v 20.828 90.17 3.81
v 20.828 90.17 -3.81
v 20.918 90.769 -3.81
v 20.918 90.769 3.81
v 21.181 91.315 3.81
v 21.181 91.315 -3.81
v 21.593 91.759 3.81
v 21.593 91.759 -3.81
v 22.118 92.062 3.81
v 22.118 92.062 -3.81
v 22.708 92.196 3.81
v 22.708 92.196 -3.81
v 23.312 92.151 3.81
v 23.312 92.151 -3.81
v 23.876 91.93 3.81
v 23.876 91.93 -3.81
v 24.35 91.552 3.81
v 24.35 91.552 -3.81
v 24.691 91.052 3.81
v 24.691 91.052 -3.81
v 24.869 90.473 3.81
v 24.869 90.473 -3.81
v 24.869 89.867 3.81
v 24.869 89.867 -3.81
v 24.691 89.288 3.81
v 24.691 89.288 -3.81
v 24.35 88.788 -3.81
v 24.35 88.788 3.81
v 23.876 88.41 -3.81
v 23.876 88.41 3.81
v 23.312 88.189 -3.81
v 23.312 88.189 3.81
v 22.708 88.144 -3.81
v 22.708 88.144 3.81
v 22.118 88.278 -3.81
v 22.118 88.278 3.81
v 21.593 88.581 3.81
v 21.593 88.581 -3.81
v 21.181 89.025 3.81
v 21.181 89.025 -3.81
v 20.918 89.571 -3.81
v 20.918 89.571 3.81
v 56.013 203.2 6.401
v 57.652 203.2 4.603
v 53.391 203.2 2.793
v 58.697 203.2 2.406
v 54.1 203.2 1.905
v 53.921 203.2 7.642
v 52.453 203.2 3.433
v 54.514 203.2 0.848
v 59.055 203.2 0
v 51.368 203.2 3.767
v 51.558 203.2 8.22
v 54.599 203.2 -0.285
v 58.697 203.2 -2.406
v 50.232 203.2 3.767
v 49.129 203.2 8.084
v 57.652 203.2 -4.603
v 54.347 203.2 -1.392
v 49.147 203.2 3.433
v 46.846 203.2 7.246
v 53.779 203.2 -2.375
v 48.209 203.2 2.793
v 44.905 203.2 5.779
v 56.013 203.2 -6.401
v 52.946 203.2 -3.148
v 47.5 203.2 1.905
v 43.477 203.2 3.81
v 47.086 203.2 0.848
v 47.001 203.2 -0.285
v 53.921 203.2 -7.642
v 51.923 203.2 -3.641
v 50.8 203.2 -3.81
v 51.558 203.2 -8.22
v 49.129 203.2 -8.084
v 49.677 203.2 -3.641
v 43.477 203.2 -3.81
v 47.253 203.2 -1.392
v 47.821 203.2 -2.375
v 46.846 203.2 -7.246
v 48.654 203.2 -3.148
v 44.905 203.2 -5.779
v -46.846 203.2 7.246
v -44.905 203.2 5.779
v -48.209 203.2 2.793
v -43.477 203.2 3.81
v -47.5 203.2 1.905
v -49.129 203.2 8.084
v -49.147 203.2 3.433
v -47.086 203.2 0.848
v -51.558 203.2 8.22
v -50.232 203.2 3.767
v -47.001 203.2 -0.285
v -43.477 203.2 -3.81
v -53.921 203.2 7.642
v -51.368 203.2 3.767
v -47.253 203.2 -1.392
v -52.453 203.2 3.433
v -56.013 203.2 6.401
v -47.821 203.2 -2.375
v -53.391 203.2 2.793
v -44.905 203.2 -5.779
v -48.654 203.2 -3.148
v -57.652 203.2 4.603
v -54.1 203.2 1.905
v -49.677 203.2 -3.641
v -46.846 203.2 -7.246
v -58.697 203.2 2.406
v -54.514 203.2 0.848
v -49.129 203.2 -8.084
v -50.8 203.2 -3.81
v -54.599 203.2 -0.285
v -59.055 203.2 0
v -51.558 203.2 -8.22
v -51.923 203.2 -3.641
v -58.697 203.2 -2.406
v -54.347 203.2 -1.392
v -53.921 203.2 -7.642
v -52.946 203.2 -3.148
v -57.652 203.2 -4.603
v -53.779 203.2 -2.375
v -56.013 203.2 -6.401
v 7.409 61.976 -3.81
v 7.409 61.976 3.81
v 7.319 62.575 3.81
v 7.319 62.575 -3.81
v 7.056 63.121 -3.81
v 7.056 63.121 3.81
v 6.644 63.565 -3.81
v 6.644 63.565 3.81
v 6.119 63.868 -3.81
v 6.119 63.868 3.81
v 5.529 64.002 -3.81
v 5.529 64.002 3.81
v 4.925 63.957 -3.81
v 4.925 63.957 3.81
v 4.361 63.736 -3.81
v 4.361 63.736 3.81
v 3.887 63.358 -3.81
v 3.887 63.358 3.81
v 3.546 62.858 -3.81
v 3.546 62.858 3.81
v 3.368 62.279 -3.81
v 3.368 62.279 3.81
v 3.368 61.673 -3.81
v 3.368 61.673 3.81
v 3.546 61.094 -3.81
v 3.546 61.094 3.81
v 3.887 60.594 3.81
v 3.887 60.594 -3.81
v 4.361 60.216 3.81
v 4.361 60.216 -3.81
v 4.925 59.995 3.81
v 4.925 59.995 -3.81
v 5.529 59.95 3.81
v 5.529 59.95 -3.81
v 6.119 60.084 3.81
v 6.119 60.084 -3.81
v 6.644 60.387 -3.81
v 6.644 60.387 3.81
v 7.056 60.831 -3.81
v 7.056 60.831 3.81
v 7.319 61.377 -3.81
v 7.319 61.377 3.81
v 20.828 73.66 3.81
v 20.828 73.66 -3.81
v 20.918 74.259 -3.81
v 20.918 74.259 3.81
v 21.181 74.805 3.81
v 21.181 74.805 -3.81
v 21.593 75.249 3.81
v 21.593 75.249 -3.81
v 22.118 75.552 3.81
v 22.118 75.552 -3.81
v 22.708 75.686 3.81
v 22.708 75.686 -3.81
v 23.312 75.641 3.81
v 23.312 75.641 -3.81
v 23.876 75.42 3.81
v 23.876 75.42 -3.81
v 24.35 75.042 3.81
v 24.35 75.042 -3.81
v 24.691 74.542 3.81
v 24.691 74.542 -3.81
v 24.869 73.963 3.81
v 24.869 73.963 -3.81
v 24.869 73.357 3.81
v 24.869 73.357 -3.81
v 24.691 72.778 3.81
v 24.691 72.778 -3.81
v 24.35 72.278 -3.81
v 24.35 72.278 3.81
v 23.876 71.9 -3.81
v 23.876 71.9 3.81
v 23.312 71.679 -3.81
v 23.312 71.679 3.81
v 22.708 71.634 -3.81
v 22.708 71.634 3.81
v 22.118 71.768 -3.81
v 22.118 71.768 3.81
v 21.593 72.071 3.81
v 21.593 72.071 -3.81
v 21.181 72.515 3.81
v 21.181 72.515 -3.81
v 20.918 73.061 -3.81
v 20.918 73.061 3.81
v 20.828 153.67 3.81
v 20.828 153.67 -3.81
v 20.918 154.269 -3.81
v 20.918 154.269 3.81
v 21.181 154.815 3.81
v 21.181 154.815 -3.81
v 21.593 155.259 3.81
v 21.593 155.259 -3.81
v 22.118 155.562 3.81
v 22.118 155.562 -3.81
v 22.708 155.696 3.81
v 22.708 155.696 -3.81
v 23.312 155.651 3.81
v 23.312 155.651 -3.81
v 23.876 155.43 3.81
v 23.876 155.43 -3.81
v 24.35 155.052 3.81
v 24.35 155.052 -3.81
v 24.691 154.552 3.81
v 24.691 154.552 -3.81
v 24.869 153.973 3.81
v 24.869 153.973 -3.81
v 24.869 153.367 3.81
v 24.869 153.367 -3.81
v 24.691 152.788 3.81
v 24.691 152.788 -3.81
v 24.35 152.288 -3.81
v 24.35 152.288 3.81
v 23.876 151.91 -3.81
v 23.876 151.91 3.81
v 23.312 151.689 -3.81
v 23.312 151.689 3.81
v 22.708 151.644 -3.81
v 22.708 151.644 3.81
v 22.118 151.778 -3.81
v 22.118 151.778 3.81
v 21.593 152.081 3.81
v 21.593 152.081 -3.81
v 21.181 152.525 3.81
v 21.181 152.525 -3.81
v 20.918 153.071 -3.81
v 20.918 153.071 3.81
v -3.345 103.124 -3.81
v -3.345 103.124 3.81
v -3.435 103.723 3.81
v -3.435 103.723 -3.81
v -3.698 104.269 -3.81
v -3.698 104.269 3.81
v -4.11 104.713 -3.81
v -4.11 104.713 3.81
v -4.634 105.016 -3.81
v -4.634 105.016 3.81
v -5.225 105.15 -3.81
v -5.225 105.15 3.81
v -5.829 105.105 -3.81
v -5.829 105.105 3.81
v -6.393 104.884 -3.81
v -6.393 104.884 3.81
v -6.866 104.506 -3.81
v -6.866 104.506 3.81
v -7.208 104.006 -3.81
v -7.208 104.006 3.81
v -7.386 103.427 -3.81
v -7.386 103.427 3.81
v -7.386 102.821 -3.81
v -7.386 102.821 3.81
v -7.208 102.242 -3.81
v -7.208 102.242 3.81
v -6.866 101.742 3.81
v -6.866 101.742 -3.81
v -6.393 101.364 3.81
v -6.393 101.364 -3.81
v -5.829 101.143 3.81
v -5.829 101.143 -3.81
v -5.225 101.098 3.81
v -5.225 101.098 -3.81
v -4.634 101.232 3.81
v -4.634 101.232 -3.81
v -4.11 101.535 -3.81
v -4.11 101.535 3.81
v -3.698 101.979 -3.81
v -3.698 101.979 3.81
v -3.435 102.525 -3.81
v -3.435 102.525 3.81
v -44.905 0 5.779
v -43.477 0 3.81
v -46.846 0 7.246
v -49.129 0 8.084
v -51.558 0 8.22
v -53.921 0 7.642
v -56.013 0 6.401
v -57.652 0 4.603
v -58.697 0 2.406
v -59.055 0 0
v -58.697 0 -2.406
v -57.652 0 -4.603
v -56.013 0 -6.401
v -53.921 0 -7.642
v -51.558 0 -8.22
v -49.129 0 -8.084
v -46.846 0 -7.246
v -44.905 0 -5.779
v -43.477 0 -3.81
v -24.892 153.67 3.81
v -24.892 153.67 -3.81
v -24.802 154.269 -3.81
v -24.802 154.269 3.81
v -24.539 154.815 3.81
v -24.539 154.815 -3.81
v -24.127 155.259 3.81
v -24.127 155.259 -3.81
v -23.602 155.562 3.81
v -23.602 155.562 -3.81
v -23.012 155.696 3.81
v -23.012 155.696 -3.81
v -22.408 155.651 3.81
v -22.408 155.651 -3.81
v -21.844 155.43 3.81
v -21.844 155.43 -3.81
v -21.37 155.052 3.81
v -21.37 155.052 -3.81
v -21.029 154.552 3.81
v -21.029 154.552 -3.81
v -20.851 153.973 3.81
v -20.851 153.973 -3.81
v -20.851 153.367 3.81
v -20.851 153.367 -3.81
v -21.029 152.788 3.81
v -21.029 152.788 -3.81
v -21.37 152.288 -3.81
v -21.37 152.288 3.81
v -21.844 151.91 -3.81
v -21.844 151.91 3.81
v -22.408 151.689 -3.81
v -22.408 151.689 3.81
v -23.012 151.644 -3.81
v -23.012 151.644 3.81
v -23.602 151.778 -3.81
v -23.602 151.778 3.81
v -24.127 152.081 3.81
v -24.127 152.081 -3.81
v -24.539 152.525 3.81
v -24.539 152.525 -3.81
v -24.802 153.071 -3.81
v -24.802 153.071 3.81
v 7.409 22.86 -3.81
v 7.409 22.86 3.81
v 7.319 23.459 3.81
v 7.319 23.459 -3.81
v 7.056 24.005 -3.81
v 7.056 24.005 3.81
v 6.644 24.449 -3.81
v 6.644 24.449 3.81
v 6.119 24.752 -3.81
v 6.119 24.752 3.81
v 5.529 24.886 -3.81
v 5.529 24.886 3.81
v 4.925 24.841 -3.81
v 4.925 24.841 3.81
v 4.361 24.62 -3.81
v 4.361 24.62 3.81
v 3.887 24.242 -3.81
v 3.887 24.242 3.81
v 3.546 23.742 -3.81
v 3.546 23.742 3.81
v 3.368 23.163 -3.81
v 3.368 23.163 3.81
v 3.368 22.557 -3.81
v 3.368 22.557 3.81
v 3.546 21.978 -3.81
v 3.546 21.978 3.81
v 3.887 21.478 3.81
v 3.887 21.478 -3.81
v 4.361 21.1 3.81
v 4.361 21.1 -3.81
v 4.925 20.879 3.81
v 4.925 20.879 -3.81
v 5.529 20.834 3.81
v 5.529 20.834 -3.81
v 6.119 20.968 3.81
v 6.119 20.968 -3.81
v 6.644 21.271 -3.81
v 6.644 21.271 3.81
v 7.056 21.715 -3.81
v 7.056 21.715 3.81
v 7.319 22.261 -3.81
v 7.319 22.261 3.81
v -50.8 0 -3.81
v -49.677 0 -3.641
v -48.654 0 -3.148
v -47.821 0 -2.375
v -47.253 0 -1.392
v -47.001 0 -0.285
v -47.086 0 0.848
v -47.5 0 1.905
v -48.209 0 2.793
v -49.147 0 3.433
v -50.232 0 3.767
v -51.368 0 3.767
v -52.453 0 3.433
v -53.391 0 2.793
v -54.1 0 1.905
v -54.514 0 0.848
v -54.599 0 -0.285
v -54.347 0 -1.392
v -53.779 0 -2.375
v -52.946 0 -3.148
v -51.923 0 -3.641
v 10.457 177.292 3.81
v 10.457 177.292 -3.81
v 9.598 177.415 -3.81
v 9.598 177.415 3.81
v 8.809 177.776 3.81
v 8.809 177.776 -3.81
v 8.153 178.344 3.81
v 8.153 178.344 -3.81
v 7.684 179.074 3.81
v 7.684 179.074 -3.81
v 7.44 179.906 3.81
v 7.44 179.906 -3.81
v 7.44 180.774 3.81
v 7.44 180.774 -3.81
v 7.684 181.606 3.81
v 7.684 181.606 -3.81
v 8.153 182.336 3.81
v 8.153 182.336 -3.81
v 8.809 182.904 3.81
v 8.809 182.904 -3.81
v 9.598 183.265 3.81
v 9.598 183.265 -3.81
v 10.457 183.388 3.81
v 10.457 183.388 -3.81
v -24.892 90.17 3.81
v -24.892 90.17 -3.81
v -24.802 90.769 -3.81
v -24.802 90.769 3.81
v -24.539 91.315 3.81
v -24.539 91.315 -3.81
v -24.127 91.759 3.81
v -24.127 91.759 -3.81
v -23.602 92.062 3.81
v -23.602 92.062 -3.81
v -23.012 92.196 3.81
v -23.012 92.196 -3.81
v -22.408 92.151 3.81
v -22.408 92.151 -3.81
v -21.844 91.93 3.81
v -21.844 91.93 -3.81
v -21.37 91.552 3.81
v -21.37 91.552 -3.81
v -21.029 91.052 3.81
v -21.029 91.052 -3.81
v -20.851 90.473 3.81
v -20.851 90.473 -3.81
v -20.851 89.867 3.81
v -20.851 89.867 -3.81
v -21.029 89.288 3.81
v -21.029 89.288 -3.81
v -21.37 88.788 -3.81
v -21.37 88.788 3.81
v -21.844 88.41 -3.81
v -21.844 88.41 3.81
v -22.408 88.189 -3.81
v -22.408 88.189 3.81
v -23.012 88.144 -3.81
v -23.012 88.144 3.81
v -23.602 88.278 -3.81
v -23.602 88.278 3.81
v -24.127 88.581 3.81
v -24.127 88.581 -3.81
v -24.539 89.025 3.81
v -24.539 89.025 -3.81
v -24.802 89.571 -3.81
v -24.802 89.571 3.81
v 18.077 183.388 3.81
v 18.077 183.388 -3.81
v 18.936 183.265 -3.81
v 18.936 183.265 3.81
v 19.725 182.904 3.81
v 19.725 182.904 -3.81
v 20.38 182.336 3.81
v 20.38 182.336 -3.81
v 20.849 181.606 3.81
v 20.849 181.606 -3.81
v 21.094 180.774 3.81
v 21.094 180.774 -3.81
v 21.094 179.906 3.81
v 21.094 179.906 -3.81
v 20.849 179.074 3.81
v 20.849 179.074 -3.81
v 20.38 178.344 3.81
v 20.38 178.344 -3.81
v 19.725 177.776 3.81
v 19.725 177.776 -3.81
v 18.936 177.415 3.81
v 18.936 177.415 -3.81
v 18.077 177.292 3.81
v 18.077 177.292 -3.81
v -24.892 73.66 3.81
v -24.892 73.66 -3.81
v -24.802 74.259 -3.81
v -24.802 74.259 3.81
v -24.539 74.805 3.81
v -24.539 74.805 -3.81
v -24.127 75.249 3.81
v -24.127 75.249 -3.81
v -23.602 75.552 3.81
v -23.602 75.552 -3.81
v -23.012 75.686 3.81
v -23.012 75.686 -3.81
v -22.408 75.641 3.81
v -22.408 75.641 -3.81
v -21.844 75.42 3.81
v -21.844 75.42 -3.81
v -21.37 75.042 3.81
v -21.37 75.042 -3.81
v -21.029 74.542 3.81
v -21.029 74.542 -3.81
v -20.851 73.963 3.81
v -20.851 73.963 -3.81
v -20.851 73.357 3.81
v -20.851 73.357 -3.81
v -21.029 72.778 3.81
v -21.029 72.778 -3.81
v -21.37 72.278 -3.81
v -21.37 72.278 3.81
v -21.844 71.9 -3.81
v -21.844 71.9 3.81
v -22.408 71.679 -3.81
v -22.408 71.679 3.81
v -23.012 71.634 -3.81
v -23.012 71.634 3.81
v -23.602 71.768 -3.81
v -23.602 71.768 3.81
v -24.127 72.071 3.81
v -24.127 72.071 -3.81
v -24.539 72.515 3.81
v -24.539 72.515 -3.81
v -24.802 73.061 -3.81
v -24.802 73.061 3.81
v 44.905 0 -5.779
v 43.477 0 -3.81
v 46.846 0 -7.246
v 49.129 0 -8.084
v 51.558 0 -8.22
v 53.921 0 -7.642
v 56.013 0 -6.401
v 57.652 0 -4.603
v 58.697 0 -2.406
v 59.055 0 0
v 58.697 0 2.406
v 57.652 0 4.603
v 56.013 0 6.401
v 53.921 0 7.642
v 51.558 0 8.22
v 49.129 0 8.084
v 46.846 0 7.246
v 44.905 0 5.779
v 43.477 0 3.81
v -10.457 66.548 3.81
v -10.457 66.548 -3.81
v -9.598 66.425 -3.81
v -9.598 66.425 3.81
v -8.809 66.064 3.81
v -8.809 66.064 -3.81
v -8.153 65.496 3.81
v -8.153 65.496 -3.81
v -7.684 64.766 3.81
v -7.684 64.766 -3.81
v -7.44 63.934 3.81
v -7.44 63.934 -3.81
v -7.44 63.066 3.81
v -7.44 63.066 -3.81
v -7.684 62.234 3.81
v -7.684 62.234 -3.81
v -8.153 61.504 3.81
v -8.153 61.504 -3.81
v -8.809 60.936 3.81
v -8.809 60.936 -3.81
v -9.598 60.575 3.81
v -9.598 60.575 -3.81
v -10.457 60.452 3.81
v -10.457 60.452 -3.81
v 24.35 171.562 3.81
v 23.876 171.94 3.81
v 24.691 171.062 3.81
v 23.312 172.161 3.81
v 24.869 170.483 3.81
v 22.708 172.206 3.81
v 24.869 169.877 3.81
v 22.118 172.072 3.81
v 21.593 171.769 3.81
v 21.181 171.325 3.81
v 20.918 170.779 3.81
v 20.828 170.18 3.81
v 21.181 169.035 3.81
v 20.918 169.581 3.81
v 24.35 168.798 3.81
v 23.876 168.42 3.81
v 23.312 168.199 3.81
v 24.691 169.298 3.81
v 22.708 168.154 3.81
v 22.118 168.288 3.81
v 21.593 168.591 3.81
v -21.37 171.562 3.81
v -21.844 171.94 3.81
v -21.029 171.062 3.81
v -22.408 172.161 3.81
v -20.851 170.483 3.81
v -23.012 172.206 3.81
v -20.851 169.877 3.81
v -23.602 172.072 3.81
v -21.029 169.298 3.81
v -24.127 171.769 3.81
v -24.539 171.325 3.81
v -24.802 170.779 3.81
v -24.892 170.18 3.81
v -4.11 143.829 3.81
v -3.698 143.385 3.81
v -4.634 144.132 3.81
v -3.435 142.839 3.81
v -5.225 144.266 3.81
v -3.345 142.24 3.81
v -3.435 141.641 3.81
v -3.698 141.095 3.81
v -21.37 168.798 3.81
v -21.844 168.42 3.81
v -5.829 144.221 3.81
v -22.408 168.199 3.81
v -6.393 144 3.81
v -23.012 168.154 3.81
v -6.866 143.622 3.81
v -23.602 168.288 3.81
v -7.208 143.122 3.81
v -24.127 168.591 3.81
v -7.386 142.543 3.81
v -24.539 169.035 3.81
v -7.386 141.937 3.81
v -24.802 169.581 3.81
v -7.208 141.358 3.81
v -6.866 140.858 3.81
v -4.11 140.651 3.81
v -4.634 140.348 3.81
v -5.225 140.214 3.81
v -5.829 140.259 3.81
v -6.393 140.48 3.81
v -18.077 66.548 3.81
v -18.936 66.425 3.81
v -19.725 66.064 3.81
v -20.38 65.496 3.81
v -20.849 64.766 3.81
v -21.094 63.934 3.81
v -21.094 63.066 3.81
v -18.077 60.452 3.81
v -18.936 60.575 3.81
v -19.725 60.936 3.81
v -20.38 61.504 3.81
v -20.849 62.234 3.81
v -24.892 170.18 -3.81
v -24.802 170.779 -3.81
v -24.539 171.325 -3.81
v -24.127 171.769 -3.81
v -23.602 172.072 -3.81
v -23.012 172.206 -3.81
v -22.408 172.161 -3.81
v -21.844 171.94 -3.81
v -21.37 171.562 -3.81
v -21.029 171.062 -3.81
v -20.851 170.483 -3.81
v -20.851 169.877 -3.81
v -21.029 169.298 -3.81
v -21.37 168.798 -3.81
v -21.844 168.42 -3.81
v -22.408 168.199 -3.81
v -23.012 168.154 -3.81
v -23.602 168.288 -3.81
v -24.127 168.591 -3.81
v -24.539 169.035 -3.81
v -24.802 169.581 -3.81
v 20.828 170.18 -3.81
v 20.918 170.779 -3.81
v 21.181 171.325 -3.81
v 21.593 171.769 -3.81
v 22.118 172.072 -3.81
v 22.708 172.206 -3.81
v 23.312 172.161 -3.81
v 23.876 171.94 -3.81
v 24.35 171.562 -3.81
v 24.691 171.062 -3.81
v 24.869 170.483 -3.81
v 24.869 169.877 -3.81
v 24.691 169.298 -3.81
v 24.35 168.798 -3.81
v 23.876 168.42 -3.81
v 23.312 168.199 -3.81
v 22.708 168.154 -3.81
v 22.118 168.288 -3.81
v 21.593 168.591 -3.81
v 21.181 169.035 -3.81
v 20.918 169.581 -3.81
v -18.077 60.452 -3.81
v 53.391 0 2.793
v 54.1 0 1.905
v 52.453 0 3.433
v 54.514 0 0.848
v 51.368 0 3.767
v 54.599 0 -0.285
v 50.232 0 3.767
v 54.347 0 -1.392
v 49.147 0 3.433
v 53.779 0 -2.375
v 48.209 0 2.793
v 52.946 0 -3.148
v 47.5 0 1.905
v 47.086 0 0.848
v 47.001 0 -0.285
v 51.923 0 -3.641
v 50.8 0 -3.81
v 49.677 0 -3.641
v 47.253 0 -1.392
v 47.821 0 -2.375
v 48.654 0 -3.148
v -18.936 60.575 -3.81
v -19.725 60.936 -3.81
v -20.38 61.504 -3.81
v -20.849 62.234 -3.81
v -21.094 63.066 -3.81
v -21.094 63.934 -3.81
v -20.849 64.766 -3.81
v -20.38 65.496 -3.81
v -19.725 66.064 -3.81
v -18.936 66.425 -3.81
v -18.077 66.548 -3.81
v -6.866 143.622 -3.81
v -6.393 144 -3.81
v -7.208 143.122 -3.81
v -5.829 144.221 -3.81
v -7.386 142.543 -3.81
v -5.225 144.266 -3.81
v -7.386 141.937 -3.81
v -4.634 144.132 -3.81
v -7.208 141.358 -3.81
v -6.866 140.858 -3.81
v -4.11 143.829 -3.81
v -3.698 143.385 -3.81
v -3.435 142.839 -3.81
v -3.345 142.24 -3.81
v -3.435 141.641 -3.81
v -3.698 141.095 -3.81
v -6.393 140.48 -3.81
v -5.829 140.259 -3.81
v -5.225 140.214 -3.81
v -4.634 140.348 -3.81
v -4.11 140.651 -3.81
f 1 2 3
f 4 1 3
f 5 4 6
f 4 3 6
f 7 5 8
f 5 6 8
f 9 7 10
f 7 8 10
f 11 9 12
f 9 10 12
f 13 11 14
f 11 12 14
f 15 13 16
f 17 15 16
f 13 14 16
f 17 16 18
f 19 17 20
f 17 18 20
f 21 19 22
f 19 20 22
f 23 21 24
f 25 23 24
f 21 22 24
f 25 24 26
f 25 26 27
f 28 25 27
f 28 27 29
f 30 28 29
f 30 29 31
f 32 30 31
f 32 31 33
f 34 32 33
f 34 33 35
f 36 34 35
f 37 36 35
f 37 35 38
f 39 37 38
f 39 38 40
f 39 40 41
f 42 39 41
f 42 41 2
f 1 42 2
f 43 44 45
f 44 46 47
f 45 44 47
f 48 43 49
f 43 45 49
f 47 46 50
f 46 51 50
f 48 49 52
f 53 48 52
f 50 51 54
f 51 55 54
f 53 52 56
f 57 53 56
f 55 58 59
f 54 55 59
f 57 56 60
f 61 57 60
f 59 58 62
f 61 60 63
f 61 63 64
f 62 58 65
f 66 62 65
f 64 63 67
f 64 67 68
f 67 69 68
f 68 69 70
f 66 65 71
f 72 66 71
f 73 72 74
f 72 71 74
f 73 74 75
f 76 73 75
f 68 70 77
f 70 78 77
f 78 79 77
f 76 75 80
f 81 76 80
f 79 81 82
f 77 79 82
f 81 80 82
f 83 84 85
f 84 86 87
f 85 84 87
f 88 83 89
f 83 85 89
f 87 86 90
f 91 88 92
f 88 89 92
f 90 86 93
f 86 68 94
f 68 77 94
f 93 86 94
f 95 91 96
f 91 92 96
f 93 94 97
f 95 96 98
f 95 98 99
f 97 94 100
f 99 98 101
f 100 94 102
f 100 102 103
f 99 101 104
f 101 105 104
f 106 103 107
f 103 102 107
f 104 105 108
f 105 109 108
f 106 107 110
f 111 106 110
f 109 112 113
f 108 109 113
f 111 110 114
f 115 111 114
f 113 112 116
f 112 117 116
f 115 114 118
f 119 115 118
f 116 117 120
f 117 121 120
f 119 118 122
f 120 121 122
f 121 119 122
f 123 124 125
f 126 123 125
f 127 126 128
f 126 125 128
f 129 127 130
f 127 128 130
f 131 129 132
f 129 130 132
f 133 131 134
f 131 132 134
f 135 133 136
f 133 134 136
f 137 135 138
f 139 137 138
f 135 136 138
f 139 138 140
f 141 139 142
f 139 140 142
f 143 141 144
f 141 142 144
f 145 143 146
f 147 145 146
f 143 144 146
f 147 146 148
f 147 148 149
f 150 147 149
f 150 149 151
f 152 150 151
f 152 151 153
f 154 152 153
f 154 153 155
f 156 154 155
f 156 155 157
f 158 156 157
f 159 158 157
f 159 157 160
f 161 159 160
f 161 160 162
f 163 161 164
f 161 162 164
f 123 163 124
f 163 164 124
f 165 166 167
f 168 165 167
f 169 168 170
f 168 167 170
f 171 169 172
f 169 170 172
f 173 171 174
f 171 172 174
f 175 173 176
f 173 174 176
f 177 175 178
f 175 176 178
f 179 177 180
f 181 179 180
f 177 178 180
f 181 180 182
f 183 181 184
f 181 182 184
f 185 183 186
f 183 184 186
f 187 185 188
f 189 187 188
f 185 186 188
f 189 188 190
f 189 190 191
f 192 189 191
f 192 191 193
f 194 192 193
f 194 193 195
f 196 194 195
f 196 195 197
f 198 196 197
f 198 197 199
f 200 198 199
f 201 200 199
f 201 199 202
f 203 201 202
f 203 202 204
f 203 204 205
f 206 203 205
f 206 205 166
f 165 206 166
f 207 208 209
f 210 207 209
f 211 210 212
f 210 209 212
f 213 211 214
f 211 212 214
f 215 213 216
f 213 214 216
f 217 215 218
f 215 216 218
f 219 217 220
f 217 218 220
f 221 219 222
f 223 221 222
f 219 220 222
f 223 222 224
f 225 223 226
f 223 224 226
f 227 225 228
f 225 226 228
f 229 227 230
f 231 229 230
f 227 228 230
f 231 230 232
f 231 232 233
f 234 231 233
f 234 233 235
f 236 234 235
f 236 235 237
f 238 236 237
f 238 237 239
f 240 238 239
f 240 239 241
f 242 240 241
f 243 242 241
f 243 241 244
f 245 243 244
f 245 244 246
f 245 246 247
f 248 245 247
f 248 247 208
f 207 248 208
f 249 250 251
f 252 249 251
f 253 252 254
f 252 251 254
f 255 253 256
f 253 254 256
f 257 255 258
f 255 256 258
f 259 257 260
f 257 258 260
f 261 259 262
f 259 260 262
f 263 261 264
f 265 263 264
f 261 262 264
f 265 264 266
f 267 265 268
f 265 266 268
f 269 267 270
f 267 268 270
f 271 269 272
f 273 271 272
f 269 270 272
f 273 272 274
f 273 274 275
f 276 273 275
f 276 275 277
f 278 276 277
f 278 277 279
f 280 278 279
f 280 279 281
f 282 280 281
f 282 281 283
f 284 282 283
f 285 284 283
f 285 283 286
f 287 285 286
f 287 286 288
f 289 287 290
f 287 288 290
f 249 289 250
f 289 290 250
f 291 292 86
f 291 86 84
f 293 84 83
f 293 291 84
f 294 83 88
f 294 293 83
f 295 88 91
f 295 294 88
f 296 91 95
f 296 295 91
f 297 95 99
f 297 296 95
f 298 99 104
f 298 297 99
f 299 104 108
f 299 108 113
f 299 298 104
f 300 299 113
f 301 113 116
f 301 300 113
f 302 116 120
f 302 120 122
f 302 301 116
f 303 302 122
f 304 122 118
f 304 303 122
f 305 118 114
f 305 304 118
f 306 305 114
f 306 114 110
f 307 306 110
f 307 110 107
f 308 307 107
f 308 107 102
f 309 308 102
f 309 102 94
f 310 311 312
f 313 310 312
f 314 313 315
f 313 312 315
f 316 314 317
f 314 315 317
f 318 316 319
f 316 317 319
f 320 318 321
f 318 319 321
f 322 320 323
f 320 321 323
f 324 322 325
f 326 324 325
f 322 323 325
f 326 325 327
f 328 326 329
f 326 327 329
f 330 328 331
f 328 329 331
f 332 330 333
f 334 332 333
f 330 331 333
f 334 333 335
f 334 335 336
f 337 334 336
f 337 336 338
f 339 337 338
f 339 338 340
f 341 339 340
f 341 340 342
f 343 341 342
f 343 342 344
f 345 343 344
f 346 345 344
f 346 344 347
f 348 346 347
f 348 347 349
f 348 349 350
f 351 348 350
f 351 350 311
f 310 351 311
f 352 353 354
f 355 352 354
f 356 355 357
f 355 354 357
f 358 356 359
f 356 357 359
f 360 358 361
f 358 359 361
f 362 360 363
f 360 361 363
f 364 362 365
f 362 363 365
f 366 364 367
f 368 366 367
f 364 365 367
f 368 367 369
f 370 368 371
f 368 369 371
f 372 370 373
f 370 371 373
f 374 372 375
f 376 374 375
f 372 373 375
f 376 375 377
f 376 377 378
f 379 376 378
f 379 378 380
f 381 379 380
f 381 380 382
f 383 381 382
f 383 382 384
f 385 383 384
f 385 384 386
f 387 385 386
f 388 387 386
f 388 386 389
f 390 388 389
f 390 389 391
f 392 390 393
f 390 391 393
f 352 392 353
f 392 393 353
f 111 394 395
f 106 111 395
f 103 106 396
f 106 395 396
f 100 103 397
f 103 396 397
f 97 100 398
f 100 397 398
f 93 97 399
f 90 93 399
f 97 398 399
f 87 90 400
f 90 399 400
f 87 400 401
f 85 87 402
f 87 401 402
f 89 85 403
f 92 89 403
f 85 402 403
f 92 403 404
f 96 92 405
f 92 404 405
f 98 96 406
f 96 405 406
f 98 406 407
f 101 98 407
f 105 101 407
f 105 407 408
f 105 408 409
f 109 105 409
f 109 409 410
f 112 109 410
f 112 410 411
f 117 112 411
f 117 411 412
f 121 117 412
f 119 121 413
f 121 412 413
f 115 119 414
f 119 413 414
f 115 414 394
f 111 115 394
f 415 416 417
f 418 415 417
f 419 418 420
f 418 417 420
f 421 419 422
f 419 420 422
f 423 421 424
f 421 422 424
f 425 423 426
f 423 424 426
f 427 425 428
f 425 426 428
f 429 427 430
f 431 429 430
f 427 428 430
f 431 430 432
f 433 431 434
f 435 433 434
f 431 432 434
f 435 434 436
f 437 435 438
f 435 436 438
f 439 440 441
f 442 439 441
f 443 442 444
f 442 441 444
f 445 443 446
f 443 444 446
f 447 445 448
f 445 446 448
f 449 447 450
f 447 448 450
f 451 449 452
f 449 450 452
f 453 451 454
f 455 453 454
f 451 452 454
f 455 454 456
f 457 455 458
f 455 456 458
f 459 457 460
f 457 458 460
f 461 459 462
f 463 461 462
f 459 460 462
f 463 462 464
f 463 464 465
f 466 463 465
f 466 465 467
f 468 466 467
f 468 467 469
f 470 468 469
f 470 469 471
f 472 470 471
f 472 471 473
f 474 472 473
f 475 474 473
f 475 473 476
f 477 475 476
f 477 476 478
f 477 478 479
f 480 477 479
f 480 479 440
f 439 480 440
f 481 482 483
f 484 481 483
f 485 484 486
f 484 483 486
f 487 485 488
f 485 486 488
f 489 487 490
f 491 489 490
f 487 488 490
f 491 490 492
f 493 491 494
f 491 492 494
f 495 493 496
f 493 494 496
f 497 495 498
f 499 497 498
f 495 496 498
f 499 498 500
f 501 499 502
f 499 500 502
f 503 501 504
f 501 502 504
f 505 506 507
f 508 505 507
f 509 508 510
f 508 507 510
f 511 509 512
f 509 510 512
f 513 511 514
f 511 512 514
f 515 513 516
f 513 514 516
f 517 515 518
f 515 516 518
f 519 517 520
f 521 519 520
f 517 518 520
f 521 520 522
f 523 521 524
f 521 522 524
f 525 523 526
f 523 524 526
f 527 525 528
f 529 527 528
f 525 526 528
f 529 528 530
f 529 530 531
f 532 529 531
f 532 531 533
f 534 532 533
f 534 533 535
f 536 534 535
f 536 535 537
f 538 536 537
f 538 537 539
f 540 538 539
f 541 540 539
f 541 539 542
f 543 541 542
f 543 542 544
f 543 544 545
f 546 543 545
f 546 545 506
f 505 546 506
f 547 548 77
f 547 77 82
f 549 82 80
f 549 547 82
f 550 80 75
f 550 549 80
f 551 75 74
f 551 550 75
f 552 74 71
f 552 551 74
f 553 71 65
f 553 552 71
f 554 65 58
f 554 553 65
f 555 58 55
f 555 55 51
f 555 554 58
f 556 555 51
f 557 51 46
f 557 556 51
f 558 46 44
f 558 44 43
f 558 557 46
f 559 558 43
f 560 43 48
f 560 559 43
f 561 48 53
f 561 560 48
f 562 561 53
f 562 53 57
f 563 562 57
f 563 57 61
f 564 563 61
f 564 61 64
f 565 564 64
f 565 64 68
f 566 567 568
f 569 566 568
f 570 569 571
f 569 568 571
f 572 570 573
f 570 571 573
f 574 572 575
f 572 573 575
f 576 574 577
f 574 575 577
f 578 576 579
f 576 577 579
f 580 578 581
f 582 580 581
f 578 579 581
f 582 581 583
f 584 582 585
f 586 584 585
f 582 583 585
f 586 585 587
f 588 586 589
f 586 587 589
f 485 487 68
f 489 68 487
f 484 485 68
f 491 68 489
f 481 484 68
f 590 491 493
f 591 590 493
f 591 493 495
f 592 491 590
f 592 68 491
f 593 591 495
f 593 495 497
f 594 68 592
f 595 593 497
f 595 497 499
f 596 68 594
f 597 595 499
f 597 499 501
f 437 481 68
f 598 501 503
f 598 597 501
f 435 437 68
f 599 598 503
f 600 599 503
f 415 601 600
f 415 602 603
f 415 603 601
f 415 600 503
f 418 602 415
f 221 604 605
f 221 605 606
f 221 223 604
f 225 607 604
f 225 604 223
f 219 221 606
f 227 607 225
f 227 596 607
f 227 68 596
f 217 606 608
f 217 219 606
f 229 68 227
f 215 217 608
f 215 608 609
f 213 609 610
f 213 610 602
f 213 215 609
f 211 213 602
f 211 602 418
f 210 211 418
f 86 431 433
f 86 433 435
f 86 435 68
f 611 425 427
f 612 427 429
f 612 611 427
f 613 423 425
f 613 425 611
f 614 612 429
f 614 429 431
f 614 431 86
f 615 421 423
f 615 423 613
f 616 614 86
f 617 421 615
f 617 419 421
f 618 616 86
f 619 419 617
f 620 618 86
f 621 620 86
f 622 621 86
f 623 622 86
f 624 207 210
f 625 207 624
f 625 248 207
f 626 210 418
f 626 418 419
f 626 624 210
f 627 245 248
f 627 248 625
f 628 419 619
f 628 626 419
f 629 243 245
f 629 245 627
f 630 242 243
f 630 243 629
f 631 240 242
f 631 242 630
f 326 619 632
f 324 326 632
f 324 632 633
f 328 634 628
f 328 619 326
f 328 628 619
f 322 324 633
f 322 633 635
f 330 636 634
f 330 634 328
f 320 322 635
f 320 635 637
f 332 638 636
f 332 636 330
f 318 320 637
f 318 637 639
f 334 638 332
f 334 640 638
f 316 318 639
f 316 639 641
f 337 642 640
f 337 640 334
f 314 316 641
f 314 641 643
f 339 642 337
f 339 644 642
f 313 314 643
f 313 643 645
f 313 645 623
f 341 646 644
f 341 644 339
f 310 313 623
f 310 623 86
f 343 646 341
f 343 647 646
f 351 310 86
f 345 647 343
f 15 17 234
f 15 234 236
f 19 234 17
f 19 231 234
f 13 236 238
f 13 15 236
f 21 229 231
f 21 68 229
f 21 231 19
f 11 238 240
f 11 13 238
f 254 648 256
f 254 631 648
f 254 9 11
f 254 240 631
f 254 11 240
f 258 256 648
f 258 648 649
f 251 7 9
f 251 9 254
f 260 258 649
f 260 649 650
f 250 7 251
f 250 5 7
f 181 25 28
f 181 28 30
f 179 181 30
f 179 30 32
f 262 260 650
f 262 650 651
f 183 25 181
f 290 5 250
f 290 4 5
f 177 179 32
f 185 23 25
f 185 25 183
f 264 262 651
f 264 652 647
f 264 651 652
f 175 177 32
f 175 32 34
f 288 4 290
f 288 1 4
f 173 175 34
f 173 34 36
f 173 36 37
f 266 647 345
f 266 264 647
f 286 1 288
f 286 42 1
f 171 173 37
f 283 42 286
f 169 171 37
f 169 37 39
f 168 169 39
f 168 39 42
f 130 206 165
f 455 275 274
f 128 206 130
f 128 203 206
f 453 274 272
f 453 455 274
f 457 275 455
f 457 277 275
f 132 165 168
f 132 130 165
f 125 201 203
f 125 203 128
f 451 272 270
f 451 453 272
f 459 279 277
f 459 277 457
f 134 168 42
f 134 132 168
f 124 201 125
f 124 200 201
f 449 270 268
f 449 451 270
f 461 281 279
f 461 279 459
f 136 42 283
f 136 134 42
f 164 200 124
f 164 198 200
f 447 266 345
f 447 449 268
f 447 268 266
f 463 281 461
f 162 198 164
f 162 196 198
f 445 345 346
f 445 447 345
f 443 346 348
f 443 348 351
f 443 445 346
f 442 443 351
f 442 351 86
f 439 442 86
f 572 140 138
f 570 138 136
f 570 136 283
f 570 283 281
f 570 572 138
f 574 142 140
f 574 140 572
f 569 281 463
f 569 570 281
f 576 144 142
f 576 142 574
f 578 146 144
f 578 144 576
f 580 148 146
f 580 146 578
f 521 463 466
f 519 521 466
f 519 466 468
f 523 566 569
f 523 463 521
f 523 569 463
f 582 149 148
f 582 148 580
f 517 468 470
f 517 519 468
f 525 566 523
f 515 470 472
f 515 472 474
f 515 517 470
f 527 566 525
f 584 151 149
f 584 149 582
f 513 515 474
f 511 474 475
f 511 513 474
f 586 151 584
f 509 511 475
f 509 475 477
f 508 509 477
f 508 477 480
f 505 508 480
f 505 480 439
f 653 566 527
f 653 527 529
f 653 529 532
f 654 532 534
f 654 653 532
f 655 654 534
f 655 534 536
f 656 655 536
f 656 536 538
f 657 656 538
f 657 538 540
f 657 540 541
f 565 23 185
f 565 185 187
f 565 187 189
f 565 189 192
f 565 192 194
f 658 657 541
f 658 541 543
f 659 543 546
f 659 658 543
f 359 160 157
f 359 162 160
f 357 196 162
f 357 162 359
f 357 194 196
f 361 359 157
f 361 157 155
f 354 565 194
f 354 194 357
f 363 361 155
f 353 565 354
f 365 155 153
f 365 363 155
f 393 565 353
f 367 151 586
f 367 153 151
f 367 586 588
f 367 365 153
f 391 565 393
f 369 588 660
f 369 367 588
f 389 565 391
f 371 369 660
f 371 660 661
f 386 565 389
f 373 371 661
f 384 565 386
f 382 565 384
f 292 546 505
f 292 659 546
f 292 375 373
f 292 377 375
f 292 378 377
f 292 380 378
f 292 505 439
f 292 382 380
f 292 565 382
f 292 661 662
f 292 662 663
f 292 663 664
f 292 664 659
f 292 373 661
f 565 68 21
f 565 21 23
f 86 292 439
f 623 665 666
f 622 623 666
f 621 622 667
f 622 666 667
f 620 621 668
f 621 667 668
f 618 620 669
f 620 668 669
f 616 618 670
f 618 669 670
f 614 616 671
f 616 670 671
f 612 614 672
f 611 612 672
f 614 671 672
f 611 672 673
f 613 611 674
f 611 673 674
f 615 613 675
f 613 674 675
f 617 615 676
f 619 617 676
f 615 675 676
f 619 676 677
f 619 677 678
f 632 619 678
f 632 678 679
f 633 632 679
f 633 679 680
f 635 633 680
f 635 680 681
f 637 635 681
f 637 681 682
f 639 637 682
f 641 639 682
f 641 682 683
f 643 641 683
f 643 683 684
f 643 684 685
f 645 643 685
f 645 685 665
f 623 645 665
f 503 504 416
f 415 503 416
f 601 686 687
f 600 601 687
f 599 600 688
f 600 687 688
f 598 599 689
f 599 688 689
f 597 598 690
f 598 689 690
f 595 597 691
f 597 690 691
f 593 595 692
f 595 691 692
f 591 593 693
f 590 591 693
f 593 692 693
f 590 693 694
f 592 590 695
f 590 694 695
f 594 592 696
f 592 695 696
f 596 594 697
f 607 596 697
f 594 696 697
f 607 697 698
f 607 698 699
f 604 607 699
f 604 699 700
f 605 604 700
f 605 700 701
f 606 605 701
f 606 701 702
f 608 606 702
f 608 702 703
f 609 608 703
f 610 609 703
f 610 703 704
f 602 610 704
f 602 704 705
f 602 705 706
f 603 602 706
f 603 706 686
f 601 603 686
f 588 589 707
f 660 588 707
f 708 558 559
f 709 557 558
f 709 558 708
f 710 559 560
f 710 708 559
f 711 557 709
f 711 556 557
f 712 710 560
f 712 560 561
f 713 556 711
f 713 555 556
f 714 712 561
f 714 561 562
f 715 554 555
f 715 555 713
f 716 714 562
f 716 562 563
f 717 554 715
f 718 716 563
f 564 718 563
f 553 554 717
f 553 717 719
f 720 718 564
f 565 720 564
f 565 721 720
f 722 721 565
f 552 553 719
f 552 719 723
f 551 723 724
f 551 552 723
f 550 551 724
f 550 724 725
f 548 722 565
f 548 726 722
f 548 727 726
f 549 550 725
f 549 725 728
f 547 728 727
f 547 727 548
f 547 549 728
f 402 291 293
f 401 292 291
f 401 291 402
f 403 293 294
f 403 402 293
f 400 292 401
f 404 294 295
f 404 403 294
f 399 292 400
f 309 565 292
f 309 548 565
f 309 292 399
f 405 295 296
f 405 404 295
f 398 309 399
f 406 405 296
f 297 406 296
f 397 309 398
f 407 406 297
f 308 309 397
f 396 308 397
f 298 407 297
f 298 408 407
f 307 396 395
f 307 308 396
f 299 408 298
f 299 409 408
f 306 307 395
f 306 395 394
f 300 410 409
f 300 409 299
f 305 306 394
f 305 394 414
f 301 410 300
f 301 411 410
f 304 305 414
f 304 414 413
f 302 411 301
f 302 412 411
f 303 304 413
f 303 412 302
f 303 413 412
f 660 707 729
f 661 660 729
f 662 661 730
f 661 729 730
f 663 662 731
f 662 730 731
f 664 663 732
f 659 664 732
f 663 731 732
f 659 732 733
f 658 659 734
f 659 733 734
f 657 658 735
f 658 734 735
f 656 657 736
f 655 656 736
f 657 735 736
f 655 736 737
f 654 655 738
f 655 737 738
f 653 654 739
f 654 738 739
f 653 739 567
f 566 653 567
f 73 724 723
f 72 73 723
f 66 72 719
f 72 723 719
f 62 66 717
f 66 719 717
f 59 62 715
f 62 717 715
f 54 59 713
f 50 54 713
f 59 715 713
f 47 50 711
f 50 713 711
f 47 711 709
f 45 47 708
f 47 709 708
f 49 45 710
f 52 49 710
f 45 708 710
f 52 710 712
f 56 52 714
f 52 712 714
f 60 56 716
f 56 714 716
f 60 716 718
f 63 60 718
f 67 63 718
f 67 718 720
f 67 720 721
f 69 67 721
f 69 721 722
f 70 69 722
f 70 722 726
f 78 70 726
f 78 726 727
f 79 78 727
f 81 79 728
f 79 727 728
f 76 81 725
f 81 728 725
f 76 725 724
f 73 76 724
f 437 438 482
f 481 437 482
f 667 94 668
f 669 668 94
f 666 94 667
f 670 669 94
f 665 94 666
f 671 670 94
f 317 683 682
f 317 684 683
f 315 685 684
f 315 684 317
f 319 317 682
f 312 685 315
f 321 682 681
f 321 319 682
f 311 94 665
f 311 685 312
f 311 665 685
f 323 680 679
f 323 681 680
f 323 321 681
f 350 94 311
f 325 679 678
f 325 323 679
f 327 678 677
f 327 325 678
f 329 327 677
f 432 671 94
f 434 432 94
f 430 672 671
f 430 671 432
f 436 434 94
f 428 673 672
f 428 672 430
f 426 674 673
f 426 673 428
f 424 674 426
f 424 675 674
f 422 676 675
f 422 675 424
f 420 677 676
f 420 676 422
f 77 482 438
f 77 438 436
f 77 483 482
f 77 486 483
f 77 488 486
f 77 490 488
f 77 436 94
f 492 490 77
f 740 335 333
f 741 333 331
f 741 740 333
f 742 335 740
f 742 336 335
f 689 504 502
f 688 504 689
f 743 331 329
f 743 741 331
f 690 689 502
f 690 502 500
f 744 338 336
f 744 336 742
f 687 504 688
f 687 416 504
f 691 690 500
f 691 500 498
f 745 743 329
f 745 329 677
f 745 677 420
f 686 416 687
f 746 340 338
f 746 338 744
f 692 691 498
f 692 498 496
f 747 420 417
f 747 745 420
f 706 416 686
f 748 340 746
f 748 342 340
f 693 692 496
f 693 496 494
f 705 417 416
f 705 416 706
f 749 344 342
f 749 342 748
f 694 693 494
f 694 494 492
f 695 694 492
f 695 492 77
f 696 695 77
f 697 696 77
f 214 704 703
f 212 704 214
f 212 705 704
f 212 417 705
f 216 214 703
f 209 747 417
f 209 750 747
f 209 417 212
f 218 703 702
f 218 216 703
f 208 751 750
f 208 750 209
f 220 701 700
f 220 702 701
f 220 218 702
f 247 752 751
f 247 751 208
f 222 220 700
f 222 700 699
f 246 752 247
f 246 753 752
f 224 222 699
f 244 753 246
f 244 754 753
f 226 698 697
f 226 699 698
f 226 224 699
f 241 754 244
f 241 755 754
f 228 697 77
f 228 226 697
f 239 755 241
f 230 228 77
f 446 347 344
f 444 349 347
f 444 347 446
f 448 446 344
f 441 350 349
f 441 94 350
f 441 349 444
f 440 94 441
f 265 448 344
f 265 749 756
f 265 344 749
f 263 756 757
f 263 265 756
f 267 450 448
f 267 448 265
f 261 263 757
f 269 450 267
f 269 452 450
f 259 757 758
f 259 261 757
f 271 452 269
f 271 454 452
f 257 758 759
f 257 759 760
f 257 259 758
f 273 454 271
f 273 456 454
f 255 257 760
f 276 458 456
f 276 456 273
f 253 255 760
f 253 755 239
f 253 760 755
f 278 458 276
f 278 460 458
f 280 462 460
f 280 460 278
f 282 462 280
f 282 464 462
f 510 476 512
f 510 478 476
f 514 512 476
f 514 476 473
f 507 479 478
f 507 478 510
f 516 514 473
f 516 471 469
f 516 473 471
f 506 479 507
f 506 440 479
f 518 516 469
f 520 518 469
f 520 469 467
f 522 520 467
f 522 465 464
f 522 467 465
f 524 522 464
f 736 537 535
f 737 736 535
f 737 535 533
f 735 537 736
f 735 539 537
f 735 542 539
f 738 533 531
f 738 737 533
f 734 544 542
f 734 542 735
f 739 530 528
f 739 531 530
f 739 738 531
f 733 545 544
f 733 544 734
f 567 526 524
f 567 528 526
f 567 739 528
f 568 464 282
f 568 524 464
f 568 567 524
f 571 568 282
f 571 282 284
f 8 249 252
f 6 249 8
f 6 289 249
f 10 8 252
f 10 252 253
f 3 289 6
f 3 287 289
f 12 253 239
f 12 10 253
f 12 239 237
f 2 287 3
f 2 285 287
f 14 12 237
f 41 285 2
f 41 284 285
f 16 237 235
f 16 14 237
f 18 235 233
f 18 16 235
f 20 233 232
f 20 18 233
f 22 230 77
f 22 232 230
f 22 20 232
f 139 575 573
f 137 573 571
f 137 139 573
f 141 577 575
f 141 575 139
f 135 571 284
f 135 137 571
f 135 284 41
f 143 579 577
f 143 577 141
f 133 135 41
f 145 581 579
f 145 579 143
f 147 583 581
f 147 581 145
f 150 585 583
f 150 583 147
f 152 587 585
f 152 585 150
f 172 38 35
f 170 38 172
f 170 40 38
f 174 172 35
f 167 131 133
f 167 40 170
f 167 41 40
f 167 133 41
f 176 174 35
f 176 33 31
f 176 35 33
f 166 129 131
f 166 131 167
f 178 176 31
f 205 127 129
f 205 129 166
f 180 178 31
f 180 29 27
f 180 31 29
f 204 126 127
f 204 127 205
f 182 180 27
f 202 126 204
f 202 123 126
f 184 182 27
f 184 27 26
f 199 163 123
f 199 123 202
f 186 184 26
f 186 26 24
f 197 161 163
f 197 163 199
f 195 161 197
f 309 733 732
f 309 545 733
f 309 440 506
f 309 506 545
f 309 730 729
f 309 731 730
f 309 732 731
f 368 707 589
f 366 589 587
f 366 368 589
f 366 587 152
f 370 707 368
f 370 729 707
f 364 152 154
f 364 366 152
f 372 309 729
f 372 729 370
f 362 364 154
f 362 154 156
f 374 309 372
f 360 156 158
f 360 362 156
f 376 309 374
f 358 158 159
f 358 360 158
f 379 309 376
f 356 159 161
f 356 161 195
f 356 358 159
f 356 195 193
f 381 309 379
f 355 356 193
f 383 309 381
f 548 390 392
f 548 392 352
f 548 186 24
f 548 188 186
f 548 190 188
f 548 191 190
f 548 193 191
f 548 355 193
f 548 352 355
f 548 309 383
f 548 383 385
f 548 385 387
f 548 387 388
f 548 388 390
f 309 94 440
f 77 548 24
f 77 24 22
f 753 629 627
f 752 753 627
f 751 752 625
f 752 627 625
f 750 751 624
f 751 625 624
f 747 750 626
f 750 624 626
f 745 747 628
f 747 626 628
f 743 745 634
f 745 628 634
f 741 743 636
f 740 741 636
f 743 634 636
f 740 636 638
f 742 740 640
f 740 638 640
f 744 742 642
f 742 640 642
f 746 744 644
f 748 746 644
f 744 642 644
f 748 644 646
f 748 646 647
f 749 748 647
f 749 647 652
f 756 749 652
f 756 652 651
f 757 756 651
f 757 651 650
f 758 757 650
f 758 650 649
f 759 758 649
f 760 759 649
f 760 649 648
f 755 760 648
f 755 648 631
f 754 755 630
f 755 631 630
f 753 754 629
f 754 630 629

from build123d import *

# Parameters (mm, degrees)
BOSS_EXTRUDE1_DEPTH     = 203.2
SKETCH2_R               = 3.81
CUT_EXTRUDE1_DEPTH      = 203.2
CUT_EXTRUDE2_DEPTH      = 28.956
CUT_EXTRUDE2_DEPTH_BACK = 36.322
SKETCH5_R               = 2.032
CUT_EXTRUDE3_DEPTH      = 45.974
SKETCH6_R               = 2.032
CUT_EXTRUDE4_DEPTH      = 7.62


with BuildPart() as part:
    # Sketch1 → Boss-Extrude1 (new body)
    with BuildSketch(Plane(origin=(0, 0, 0), x_dir=(1, 0, 0), z_dir=(0, 1, 0))):
        with BuildLine():
            Line((-43.476822752, 3.81), (43.476822752, 3.81))
            ThreePointArc((43.476822752, 3.81), (59.055, 0), (43.476822752, -3.81))
            Line((43.476822752, -3.81), (-43.476822752, -3.81))
            ThreePointArc((-43.476822752, -3.81), (-59.055, 0), (-43.476822752, 3.81))
        make_face()
    extrude(amount=BOSS_EXTRUDE1_DEPTH)

    # Sketch2 → Cut-Extrude1 (cut)
    with BuildSketch(Plane.XZ):
        with Locations(Location((-50.8, 0, 0), (0, 0, 270))):
            Circle(SKETCH2_R)
        with Locations(Location((50.8, 0, 0), (0, 0, 270))):
            Circle(SKETCH2_R)
    extrude(amount=-CUT_EXTRUDE1_DEPTH, mode=Mode.SUBTRACT)

    # Sketch3 → Cut-Extrude2 (cut, two sides: drawn at the far end of the back side and taken through both)
    with BuildSketch(Plane.XY.offset(3.81).offset(-CUT_EXTRUDE2_DEPTH_BACK)):
        with BuildLine():
            Line((18.076822752, 177.292), (10.456822752, 177.292))
            ThreePointArc((10.456822752, 177.292), (7.408822752, 180.34), (10.456822752, 183.388))
            Line((10.456822752, 183.388), (18.076822752, 183.388))
            ThreePointArc((18.076822752, 183.388), (21.124822752, 180.34), (18.076822752, 177.292))
        make_face()
        with BuildLine():
            Line((-18.076822752, 66.548), (-10.456822752, 66.548))
            ThreePointArc((-10.456822752, 66.548), (-7.408822752, 63.5), (-10.456822752, 60.452))
            Line((-10.456822752, 60.452), (-18.076822752, 60.452))
            ThreePointArc((-18.076822752, 60.452), (-21.124822752, 63.5), (-18.076822752, 66.548))
        make_face()
    extrude(amount=CUT_EXTRUDE2_DEPTH + CUT_EXTRUDE2_DEPTH_BACK, mode=Mode.SUBTRACT)

    # Sketch5 → Cut-Extrude3 (cut)
    with BuildSketch(Plane(origin=(0, 0, -3.81), x_dir=(-1, 0, 0), z_dir=(0, 0, -1))):
        with Locations((-22.86, 170.18)):
            Circle(SKETCH5_R)
        with Locations((-22.86, 153.67)):
            Circle(SKETCH5_R)
        with Locations((22.86, 170.18)):
            Circle(SKETCH5_R)
        with Locations((22.86, 153.67)):
            Circle(SKETCH5_R)
        with Locations((-22.86, 90.17)):
            Circle(SKETCH5_R)
        with Locations((-22.86, 73.66)):
            Circle(SKETCH5_R)
        with Locations((22.86, 90.17)):
            Circle(SKETCH5_R)
        with Locations((22.86, 73.66)):
            Circle(SKETCH5_R)
    extrude(amount=-CUT_EXTRUDE3_DEPTH, mode=Mode.SUBTRACT)

    # Sketch6 → Cut-Extrude4 (cut)
    with BuildSketch(Plane.XY.offset(3.81)):
        with Locations((5.376822752, 61.976)):
            Circle(SKETCH6_R)
        with Locations((5.376822752, 22.86)):
            Circle(SKETCH6_R)
        with Locations((-5.376822752, 142.24)):
            Circle(SKETCH6_R)
        with Locations((-5.376822752, 103.124)):
            Circle(SKETCH6_R)
    extrude(amount=-CUT_EXTRUDE4_DEPTH, mode=Mode.SUBTRACT)


solid = part.part
